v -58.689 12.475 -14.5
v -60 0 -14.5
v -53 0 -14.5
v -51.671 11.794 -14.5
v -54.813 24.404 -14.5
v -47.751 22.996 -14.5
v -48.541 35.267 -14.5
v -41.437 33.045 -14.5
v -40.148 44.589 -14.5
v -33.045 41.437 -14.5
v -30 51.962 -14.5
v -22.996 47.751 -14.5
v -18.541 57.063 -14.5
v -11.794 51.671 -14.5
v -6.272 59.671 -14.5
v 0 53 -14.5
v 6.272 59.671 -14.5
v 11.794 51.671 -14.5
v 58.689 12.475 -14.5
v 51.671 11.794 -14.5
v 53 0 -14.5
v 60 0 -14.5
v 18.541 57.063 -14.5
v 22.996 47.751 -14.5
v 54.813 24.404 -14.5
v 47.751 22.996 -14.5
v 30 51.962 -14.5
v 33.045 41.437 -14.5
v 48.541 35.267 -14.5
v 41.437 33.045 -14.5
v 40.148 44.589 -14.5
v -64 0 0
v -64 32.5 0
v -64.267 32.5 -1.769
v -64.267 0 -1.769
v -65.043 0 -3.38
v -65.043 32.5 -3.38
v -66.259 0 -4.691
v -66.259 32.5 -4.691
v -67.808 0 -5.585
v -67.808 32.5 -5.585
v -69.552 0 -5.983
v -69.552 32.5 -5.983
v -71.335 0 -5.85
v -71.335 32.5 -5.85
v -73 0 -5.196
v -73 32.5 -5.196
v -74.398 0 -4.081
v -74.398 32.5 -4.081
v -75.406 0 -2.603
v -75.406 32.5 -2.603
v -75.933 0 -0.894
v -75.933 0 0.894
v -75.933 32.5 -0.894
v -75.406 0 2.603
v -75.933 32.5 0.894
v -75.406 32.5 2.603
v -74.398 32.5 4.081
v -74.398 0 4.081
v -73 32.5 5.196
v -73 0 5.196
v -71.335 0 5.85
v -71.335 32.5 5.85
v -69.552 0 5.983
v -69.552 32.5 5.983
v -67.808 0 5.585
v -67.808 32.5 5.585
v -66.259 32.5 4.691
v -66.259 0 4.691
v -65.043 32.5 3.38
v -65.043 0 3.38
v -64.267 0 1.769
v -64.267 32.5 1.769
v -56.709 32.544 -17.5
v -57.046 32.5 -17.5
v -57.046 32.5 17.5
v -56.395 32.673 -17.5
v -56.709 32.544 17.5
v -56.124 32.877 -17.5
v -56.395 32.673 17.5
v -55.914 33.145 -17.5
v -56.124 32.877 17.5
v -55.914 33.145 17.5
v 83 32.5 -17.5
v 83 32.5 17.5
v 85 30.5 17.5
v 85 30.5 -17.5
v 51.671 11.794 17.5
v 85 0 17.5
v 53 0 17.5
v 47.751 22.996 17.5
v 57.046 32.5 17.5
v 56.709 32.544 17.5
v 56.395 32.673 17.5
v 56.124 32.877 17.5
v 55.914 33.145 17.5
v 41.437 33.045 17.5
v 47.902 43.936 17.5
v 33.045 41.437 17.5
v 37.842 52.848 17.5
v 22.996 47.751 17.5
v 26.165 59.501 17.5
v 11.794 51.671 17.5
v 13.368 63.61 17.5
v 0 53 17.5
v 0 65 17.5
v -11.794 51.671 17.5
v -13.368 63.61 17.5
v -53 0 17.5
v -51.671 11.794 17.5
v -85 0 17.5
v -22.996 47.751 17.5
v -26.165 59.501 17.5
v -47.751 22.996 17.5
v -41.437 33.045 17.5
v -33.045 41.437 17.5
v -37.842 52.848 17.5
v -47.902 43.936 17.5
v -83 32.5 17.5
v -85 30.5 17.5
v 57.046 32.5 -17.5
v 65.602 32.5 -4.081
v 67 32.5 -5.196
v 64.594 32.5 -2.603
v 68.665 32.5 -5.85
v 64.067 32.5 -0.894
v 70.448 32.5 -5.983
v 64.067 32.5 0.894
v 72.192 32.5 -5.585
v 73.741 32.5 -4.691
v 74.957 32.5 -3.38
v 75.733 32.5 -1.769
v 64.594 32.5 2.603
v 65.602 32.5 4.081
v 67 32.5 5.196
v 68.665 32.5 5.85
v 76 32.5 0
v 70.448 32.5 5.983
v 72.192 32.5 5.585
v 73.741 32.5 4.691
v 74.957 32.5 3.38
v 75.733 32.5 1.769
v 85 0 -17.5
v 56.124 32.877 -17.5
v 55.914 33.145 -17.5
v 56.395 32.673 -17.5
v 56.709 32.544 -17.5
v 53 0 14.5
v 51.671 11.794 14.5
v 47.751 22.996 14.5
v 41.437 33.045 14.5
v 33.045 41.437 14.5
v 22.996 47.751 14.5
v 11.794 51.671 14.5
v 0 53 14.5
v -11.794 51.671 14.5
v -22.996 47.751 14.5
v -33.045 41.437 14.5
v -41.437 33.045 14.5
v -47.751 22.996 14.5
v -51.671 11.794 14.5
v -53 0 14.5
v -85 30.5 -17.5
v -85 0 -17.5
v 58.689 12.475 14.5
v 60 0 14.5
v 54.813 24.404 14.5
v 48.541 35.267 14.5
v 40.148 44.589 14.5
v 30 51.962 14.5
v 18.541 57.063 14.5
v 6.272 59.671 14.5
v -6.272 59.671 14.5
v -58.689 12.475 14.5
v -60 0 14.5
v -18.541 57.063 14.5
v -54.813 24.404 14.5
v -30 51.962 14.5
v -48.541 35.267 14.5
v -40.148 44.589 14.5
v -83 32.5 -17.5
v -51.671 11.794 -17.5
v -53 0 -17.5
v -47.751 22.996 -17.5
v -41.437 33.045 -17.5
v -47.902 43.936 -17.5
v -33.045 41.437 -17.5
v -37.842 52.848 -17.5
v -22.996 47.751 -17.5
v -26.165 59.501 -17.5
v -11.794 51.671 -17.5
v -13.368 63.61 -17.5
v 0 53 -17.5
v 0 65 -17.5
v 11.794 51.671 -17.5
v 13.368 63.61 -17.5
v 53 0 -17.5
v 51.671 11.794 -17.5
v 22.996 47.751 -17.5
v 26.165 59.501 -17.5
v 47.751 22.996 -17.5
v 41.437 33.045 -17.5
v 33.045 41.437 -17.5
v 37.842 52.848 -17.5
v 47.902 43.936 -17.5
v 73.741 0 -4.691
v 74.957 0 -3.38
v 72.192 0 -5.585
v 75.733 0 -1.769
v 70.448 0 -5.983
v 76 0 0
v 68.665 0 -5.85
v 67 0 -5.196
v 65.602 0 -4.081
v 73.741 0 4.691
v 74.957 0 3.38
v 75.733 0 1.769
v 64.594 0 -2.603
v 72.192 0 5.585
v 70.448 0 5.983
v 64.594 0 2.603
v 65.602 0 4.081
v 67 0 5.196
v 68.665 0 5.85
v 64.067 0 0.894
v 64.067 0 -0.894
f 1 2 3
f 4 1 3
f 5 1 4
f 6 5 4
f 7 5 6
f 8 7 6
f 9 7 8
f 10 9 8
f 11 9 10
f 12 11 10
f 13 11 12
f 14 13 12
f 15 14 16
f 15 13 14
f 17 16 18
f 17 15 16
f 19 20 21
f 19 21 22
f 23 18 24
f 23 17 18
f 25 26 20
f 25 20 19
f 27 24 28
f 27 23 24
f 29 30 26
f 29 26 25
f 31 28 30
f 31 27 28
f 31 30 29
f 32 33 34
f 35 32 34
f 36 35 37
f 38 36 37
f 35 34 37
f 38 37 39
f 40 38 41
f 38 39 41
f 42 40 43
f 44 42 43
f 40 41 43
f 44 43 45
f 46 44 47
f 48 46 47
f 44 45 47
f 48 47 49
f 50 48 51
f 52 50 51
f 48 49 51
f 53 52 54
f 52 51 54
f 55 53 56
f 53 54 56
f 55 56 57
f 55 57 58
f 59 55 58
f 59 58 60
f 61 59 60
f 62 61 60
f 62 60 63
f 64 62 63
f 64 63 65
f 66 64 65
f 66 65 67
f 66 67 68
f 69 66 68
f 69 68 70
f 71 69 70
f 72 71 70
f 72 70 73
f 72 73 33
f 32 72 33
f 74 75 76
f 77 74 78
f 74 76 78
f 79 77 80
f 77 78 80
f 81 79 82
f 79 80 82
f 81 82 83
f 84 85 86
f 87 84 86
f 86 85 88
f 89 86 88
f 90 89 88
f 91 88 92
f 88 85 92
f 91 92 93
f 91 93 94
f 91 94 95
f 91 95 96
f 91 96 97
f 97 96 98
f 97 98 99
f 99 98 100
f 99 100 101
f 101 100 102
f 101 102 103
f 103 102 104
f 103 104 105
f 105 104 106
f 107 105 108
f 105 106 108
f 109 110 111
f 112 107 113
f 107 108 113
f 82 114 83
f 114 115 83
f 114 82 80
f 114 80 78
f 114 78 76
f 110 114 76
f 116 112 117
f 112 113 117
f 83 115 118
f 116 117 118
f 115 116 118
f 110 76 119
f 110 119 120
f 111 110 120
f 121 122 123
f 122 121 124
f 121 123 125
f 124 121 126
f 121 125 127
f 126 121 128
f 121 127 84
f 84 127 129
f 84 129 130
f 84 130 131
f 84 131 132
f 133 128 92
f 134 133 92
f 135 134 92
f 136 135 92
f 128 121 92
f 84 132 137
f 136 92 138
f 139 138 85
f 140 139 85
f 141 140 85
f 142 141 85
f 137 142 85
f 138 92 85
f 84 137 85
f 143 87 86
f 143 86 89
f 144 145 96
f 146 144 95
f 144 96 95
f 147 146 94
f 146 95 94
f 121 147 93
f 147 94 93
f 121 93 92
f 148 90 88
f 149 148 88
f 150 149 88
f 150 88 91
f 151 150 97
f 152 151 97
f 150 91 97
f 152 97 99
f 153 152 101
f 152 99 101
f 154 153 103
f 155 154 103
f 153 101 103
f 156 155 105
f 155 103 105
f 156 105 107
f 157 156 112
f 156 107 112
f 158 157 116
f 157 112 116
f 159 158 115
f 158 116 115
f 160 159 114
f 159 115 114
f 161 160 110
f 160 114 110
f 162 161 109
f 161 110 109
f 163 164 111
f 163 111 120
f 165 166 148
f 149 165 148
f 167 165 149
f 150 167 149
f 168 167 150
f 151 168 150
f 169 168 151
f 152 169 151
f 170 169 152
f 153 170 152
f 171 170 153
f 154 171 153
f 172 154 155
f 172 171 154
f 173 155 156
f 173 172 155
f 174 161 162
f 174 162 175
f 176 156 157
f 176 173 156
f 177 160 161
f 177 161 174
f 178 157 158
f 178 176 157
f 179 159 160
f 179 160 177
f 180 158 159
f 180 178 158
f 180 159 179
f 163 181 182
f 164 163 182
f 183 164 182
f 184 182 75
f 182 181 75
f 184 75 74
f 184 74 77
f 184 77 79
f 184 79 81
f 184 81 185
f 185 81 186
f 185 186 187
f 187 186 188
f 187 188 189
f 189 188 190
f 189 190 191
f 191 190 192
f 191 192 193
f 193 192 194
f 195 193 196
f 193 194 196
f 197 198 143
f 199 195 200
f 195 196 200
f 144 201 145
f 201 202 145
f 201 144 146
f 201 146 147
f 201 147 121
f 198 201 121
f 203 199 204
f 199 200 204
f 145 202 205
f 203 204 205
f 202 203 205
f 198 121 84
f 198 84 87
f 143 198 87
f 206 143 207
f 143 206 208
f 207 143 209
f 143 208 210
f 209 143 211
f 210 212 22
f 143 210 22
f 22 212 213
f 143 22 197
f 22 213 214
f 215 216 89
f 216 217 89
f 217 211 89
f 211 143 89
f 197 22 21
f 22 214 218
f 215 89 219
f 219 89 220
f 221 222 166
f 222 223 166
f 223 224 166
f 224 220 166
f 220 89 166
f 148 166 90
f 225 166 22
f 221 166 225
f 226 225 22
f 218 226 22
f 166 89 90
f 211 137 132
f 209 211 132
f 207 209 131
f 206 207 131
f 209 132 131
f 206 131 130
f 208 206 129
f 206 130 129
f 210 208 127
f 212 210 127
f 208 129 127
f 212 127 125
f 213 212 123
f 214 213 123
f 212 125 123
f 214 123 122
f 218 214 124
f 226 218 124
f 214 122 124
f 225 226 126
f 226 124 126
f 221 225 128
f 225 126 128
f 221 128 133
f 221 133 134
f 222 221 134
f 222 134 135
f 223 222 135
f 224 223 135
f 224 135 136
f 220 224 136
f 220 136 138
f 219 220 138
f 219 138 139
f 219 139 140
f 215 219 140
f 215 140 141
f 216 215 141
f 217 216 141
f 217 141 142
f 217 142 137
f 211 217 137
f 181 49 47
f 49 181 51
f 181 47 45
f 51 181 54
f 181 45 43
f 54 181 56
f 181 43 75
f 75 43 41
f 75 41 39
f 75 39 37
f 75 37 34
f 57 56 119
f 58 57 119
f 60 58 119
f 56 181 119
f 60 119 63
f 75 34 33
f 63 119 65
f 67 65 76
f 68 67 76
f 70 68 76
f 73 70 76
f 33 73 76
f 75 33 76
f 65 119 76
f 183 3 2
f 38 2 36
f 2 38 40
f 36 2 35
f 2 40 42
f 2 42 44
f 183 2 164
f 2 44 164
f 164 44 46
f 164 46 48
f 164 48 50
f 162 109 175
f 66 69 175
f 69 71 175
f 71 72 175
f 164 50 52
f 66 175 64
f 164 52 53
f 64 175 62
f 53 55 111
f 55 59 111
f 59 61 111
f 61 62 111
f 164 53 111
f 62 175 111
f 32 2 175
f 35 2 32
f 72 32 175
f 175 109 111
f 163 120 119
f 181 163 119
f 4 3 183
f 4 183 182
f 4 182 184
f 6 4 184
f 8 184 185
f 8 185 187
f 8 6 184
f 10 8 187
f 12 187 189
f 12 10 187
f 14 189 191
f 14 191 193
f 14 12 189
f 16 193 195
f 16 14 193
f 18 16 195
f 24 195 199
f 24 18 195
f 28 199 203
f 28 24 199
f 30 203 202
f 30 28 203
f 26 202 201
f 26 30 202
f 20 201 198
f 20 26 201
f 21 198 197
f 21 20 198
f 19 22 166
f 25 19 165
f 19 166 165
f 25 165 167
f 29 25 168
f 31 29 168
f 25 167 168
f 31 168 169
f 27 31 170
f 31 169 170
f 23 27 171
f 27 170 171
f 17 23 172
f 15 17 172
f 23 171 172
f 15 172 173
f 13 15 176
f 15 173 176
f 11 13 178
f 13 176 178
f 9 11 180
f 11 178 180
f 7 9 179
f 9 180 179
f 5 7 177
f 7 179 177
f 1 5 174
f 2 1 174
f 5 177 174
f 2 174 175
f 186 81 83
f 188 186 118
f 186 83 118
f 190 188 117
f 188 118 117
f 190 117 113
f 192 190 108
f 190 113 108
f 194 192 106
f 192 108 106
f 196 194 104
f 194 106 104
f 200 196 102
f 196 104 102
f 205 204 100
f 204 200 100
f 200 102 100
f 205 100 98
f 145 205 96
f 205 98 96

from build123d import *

# Parameters (mm, degrees)
DODANIE_WYCI_GNI_CIE1_DEPTH = 14.5
OTW_R_12_0_12_1_D           = 12
DODANIE_WYCI_GNI_CIE2_DEPTH = 3
DODANIE_WYCI_GNI_CIE3_START = 3
DODANIE_WYCI_GNI_CIE3_DEPTH = 3


with BuildPart() as part:
    # Szkic1 → Dodanie-wyciągnięcie1 (new, symmetric)
    with BuildSketch(Plane.XY):
        with BuildLine():
            Line((-85, 30.5), (-83, 32.5))
            Line((-83, 32.5), (-57.046389972, 32.5))
            ThreePointArc((-57.046389972, 32.5), (-56.394946898, 32.672548578), (-55.914331752, 33.144946896))
            ThreePointArc((-55.914331752, 33.144946896), (0, 65), (55.914331752, 33.144946896))
            ThreePointArc((55.914331752, 33.144946896), (56.394946898, 32.672548578), (57.046389972, 32.5))
            Line((57.046389972, 32.5), (83, 32.5))
            Line((83, 32.5), (85, 30.5))
            Line((85, 30.5), (85, 0))
            Line((85, 0), (60, 0))
            ThreePointArc((60, 0), (0, 60), (-60, 0))
            Line((-60, 0), (-85, 0))
            Line((-85, 0), (-85, 30.5))
        make_face()
    extrude(amount=DODANIE_WYCI_GNI_CIE1_DEPTH, both=True)

    # Otwór Ø12.0 (12)1 (through all)
    with Locations(Plane(origin=(0, 0, 0), x_dir=(-1, 0, 0), z_dir=(0, -1, 0))):
        with Locations((70, 0), (-70, 0)):
            Hole(OTW_R_12_0_12_1_D / 2)

    # Szkic4 → Dodanie-wyciągnięcie2 (add)
    with BuildSketch(Plane(origin=(0, 0, -14.5), x_dir=(-1, 0, 0), z_dir=(0, 0, -1))):
        with BuildLine():
            Line((-53, 0), (-85, 0))
            Line((-85, 0), (-85, 30.5))
            Line((-85, 30.5), (-83, 32.5))
            Line((-83, 32.5), (-57.046389972, 32.5))
            ThreePointArc((-57.046389972, 32.5), (-56.394946898, 32.672548578), (-55.914331752, 33.144946896))
            ThreePointArc((-55.914331752, 33.144946896), (0, 65), (55.914331752, 33.144946896))
            ThreePointArc((55.914331752, 33.144946896), (56.394946898, 32.672548578), (57.046389972, 32.5))
            Line((57.046389972, 32.5), (83, 32.5))
            Line((83, 32.5), (85, 30.5))
            Line((85, 30.5), (85, 0))
            Line((85, 0), (53, 0))
            ThreePointArc((53, 0), (0, 53), (-53, 0))
        make_face()
    extrude(amount=DODANIE_WYCI_GNI_CIE2_DEPTH)

    # Szkic5 → Dodanie-wyciągnięcie3 (add)
    with BuildSketch(Plane.XY.offset(14.5).offset(DODANIE_WYCI_GNI_CIE3_START)):
        with BuildLine():
            Line((-53, 0), (-85, 0))
            Line((-85, 0), (-85, 30.5))
            Line((-85, 30.5), (-83, 32.5))
            Line((-83, 32.5), (-57.046389972, 32.5))
            ThreePointArc((-57.046389972, 32.5), (-56.394946898, 32.672548578), (-55.914331752, 33.144946896))
            ThreePointArc((-55.914331752, 33.144946896), (0, 65), (55.914331752, 33.144946896))
            ThreePointArc((55.914331752, 33.144946896), (56.394946898, 32.672548578), (57.046389972, 32.5))
            Line((57.046389972, 32.5), (83, 32.5))
            Line((83, 32.5), (85, 30.5))
            Line((85, 30.5), (85, 0))
            Line((85, 0), (53, 0))
            ThreePointArc((53, 0), (0, 53), (-53, 0))
        make_face()
    extrude(amount=-DODANIE_WYCI_GNI_CIE3_DEPTH)


solid = part.part
